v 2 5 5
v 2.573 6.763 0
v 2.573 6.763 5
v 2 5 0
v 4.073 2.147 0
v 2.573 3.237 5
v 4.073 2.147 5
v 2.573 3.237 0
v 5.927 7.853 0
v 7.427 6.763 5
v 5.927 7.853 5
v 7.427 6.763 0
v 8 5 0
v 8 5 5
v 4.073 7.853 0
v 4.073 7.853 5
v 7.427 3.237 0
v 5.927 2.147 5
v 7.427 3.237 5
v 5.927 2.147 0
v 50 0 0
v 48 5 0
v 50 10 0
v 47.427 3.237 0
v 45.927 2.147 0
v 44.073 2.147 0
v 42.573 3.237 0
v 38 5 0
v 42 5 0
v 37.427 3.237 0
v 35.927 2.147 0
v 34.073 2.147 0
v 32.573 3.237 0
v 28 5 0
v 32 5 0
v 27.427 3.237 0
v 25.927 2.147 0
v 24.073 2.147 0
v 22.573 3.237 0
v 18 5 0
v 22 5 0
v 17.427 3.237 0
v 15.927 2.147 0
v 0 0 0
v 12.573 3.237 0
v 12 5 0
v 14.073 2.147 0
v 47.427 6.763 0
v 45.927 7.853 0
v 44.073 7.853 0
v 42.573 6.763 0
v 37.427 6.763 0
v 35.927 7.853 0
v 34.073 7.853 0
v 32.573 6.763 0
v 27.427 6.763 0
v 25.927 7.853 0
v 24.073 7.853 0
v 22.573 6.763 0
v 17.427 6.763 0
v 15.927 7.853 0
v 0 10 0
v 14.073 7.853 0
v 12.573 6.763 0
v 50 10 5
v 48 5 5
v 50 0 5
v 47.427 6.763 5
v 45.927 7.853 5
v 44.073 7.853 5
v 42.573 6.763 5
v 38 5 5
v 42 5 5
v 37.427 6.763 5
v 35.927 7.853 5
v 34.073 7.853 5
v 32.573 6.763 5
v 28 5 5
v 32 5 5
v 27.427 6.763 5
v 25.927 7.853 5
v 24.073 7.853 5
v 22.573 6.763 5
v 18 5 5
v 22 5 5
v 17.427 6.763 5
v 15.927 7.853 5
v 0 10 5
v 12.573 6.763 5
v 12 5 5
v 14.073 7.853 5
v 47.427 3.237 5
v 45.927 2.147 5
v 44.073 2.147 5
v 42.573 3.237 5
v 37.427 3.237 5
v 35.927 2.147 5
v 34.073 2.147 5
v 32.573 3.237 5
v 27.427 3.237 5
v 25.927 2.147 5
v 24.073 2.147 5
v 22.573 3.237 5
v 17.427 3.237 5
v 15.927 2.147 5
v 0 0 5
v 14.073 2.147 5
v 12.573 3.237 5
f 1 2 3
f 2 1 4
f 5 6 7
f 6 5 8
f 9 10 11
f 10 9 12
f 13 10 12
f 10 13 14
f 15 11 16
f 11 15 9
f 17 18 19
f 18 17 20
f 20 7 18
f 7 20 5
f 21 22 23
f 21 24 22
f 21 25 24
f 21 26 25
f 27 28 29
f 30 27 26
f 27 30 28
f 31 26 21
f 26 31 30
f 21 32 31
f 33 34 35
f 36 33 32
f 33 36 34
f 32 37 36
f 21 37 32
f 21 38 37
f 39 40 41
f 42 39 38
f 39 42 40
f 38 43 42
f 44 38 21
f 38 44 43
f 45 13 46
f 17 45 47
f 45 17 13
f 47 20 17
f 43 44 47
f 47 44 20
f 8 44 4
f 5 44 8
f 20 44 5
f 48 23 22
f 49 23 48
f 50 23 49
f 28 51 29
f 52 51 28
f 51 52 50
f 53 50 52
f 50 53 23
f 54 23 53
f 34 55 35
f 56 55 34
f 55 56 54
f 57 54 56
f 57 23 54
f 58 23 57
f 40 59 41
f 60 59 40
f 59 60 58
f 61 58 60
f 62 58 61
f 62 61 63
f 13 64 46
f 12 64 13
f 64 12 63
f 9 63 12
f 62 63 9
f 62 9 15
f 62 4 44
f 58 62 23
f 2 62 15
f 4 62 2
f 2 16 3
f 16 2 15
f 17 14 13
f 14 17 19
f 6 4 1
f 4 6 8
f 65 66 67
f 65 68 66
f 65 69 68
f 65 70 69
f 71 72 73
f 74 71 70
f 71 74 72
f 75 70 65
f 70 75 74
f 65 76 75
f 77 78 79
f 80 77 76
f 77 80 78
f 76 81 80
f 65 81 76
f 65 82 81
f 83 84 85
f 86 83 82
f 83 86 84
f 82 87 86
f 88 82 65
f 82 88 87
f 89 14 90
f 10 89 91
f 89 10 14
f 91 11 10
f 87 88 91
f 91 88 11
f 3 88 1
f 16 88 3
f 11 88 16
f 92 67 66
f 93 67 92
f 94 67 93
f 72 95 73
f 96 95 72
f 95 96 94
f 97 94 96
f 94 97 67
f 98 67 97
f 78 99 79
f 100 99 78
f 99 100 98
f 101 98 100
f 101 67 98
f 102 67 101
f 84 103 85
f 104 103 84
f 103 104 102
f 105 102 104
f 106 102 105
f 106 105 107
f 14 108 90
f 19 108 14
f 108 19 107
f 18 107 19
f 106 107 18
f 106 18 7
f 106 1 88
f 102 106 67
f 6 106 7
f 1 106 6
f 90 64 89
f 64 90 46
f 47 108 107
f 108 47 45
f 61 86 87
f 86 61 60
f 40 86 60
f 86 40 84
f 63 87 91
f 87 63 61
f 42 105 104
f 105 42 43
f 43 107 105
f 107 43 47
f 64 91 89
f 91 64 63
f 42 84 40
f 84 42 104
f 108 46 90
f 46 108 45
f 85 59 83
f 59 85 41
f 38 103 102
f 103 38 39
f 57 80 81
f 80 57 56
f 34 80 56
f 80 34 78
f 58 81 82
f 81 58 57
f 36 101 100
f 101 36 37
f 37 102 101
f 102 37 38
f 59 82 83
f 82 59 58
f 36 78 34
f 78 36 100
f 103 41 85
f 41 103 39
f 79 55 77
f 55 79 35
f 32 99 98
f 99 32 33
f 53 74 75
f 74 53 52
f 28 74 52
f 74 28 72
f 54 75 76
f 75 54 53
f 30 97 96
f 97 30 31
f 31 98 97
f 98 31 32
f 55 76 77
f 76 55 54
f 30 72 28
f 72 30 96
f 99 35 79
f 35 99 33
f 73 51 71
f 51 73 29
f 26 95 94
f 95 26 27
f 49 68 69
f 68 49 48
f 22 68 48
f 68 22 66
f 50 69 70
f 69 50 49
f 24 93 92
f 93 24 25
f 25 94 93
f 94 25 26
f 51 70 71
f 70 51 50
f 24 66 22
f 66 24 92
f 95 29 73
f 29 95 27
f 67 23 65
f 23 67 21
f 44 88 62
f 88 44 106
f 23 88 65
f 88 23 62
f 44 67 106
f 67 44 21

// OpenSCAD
difference() {
	cube([50, 10, 5]);
	for(i = [0:4]) {
		translate([i * 10 + 5, 5, 0]) {
			cylinder(r=3, h=5);
		}
	}
}
